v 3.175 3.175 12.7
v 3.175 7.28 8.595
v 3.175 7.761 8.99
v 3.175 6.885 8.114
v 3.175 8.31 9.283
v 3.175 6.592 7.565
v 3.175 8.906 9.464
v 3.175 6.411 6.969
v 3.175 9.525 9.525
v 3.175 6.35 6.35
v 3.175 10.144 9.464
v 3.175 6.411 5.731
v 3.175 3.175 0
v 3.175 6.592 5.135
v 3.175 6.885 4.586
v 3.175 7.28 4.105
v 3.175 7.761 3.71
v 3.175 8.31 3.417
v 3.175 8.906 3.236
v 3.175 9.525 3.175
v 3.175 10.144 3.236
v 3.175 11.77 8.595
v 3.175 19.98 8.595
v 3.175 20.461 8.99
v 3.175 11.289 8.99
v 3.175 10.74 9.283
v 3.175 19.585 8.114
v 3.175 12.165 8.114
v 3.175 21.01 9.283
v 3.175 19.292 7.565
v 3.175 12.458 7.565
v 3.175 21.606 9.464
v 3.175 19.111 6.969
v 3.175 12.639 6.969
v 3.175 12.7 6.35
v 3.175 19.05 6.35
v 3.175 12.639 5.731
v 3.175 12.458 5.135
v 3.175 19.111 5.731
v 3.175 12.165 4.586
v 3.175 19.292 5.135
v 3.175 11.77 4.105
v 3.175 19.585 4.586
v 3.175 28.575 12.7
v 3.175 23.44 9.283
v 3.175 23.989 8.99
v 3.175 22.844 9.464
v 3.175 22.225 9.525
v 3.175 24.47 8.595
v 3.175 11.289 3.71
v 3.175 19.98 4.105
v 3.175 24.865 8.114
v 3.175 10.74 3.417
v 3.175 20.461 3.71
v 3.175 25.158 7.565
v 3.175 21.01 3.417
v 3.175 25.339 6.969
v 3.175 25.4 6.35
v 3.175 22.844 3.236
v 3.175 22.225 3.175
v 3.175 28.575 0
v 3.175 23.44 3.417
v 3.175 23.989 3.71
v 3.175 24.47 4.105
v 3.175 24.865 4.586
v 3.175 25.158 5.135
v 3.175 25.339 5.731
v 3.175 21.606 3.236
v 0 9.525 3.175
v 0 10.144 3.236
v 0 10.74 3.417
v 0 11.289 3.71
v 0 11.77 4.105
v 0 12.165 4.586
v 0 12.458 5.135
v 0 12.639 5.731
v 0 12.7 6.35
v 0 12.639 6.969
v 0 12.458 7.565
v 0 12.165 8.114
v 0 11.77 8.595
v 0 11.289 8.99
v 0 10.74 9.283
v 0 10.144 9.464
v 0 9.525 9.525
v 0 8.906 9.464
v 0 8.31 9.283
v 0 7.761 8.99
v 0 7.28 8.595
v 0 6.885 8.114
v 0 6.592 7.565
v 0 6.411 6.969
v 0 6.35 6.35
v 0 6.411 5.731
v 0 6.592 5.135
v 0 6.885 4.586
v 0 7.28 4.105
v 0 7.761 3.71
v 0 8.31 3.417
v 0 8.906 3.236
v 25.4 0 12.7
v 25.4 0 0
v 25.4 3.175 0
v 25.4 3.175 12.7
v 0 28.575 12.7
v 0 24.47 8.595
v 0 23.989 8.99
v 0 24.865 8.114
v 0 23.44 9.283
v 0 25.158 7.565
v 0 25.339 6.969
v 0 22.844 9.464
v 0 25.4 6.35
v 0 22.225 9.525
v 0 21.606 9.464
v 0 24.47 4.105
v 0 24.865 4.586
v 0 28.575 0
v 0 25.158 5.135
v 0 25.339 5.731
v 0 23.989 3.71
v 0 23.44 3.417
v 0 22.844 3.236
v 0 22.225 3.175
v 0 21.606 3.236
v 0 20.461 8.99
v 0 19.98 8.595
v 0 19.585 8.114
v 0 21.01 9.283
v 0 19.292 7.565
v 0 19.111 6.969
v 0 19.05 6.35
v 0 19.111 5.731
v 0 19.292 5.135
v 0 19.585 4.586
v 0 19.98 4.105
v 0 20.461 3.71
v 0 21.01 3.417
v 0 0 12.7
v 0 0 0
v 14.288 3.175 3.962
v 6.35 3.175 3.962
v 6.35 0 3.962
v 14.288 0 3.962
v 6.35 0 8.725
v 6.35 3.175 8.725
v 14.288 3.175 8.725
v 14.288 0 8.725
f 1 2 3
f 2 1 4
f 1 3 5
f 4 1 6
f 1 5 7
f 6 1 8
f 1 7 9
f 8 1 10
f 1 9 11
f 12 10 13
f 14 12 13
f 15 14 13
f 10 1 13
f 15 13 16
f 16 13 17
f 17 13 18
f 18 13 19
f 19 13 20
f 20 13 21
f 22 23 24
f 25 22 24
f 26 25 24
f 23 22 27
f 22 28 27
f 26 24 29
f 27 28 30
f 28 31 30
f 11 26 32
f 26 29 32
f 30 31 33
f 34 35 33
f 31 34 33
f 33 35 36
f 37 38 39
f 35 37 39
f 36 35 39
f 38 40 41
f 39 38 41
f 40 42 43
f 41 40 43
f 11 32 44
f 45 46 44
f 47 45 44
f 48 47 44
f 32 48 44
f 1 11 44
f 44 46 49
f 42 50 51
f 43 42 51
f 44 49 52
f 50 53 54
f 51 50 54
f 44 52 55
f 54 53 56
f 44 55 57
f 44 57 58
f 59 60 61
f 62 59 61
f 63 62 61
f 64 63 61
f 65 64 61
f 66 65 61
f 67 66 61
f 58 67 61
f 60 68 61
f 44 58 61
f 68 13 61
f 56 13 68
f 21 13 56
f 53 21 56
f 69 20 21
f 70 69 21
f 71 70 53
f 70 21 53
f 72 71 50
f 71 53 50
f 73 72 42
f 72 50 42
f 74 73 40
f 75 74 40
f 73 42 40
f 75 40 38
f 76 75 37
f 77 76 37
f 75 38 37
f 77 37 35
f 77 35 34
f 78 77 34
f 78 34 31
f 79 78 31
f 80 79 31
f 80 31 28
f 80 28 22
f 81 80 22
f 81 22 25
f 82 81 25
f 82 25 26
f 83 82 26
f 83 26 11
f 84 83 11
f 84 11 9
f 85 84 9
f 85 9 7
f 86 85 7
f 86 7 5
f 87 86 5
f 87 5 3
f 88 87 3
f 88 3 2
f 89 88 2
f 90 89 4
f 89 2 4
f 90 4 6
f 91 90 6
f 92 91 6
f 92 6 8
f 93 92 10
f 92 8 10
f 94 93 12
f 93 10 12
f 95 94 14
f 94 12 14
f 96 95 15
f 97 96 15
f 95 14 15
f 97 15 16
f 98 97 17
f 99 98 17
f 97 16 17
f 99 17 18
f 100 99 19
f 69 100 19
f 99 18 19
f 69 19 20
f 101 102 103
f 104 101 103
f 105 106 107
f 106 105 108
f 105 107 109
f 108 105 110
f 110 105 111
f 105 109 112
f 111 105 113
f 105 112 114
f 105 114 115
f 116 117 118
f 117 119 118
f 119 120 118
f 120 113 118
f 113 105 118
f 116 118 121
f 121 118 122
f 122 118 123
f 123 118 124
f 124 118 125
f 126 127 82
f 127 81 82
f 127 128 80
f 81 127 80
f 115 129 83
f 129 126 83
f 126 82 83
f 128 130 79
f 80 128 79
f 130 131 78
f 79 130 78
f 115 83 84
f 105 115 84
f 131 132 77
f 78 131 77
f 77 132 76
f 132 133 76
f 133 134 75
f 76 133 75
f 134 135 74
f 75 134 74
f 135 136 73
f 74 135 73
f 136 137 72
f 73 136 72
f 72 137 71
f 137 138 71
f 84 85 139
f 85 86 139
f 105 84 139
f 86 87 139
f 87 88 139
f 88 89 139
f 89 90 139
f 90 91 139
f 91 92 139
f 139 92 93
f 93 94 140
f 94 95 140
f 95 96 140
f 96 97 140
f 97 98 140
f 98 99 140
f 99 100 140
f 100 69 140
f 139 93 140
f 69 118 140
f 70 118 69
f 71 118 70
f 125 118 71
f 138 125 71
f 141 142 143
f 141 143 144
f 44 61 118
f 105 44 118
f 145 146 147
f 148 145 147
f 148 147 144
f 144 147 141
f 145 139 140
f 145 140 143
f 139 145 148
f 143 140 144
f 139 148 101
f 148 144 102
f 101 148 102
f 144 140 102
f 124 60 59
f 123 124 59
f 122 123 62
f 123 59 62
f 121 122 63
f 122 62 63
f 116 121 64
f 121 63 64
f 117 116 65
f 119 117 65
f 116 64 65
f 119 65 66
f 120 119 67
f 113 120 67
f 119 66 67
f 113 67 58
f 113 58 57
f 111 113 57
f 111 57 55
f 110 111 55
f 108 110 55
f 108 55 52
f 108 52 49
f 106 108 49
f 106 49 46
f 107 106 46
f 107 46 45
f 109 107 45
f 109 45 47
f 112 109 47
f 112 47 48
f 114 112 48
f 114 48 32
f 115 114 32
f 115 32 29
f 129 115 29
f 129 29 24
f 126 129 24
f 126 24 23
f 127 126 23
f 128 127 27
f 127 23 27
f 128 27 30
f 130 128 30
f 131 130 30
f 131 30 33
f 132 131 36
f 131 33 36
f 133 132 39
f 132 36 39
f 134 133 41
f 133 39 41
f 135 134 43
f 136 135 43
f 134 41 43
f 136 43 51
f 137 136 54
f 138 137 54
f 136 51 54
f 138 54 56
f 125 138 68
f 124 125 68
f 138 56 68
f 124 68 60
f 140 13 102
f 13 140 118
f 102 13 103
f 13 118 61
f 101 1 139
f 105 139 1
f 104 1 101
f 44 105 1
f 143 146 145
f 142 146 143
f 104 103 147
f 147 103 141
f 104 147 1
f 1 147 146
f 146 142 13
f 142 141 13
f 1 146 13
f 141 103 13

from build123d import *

# Parameters (mm, degrees)
BOSS_EXTRUDE1_DEPTH = 12.7
SKETCH2_R           = 3.175
CUT_EXTRUDE1_DEPTH  = 4.175
SKETCH4_W           = 7.9375
SKETCH4_H           = 4.7625
CUT_EXTRUDE2_DEPTH  = 4.175


with BuildPart() as part:
    # Sketch1 → Boss-Extrude1 (new body)
    with BuildSketch(Plane.XY):
        Polygon((0, 0), (25.4, 0), (25.4, 3.175), (3.175, 3.175), (3.175, 28.575), (0, 28.575), align=None)
    extrude(amount=BOSS_EXTRUDE1_DEPTH)

    # Sketch2 → Cut-Extrude1 (cut, through all)
    with BuildSketch(Plane(origin=(3.175, 0, 0), x_dir=(0, 0, -1), z_dir=(1, 0, 0))):
        with Locations((-6.35, 22.225)):
            Circle(SKETCH2_R)
        with Locations((-6.35, 9.525)):
            Circle(SKETCH2_R)
    extrude(amount=-CUT_EXTRUDE1_DEPTH, mode=Mode.SUBTRACT)

    # Sketch4 → Cut-Extrude2 (cut, through all)
    with BuildSketch(Plane(origin=(0, 3.175, 0), x_dir=(1, 0, 0), z_dir=(0, 1, 0))):
        with Locations((10.31875, -6.34365)):
            Rectangle(SKETCH4_W, SKETCH4_H)
    extrude(amount=-CUT_EXTRUDE2_DEPTH, mode=Mode.SUBTRACT)


solid = part.part
